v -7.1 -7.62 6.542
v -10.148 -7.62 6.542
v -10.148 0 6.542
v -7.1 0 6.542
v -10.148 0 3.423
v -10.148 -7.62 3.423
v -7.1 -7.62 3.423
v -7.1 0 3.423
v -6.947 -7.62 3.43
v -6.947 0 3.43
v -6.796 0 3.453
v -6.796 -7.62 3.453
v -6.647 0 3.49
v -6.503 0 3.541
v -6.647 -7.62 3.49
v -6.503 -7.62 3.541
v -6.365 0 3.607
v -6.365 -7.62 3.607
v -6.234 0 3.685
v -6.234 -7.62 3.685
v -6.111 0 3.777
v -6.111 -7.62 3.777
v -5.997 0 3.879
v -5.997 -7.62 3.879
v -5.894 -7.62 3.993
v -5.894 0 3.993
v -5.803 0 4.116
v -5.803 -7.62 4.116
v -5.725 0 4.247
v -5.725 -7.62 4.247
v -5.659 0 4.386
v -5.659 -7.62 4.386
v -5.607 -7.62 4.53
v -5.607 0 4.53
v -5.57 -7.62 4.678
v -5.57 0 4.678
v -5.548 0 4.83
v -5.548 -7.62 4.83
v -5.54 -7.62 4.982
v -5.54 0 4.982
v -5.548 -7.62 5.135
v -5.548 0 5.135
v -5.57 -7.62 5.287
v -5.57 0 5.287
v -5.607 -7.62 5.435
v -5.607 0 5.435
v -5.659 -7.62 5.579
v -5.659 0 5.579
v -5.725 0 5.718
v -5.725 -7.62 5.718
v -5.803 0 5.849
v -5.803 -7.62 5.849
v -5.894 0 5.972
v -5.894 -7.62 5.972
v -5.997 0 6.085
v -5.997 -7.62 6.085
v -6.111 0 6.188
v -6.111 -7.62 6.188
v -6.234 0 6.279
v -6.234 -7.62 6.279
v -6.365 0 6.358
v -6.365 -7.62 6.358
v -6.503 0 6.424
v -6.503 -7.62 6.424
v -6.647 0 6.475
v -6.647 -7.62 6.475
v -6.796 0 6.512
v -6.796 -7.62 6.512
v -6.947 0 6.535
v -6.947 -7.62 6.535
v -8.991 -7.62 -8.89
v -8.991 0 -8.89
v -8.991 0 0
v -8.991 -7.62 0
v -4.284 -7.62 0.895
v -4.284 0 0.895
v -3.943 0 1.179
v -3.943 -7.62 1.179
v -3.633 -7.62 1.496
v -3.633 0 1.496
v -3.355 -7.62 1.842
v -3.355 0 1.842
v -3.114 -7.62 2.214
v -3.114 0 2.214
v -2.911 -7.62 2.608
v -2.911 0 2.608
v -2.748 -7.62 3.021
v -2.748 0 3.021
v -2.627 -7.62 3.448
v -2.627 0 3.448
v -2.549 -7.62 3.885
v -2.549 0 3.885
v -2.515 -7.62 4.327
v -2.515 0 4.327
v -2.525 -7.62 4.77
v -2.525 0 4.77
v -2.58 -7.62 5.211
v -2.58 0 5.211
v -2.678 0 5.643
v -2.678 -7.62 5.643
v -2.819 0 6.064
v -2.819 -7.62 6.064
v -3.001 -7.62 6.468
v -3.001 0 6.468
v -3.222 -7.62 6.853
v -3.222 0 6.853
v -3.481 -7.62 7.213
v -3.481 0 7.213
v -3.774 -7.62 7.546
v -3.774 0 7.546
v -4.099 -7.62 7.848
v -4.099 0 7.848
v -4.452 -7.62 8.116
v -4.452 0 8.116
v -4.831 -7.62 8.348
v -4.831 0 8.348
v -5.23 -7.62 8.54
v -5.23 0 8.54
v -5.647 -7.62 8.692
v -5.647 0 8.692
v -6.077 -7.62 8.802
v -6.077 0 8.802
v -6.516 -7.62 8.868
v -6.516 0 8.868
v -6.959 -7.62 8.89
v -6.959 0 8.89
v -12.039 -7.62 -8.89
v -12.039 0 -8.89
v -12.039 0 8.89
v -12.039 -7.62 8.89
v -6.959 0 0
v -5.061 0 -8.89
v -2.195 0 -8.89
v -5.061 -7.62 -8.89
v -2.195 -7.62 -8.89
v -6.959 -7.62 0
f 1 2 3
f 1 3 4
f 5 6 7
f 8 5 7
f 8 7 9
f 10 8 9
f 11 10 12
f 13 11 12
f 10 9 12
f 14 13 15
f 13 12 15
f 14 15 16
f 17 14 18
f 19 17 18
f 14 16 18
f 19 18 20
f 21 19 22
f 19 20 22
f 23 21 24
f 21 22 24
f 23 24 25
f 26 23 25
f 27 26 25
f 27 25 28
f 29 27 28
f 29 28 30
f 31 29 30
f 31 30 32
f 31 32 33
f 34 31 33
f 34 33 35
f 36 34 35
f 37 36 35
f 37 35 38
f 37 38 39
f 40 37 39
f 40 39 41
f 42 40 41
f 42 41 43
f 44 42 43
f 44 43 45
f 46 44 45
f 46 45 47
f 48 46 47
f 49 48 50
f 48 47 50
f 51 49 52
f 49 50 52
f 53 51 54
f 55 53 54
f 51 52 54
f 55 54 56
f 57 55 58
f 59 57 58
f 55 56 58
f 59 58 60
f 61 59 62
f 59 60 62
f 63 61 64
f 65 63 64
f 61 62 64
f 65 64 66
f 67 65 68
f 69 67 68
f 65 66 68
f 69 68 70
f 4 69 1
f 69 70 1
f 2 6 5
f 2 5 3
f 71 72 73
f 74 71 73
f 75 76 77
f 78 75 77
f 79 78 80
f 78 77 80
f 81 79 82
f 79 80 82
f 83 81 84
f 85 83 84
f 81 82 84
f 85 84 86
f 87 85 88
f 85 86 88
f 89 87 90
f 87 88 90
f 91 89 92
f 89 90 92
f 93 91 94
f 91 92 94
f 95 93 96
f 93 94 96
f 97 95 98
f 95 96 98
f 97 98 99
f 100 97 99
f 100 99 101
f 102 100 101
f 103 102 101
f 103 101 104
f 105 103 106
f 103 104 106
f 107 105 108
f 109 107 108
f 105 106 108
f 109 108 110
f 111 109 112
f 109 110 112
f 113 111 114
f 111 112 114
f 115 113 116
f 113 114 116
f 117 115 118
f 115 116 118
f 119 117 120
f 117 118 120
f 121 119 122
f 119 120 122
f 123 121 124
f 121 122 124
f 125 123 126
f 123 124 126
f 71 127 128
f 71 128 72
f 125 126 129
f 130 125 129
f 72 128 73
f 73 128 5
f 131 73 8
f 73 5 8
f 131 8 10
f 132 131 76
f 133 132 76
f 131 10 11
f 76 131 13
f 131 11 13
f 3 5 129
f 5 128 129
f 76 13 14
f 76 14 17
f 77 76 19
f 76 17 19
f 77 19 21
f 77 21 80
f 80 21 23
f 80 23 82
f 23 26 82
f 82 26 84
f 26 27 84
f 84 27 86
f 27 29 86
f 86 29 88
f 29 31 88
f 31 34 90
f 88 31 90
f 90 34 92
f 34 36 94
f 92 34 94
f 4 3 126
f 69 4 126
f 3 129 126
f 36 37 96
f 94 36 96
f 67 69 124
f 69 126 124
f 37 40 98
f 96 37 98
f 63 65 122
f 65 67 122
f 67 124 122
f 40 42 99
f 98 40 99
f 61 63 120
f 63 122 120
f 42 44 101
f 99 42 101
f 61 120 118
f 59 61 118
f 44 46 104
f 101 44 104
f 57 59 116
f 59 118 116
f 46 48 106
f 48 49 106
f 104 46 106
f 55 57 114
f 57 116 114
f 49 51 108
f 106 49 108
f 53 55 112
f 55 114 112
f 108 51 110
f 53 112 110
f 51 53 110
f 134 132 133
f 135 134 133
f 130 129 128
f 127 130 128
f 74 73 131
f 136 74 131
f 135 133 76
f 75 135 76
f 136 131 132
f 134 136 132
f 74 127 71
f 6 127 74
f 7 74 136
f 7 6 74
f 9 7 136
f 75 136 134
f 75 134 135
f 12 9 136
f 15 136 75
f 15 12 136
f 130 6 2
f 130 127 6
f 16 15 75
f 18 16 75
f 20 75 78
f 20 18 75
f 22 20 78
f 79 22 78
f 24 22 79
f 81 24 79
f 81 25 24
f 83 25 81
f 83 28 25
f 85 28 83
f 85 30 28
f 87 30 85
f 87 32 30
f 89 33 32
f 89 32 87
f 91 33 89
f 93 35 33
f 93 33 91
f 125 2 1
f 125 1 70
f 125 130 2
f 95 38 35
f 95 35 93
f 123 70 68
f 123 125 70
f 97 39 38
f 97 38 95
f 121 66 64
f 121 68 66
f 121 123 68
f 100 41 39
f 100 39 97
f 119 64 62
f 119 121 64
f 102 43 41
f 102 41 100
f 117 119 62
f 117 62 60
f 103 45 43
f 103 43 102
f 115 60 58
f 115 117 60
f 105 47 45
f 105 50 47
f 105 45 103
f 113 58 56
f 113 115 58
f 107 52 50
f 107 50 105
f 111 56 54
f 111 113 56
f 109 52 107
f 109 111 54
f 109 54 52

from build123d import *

# Parameters (mm, degrees)
F0_W     = 3.048
F0_H     = 8.89
F1_DEPTH = 7.62
F2_DEPTH = 7.62
F3_W     = 3.048
F3_H     = 3.1197171271
F4_DEPTH = 25.4


# Not quite as in the source:
# - a feature names something its author has since deleted; it is built from what else it names


with BuildPart() as f1:
    # F0 (on Front) → F1 (new body)
    with BuildSketch(Plane.XZ):
        Polygon((-6.9585410112, 8.89), (-12.0385410112, 8.89), (-12.0385410112, 0), (-8.9905410112, 0), (-6.9585410112, 0), align=None)
        with BuildLine():
            ThreePointArc((-4.2838060673, 0.8948143739), (-2.7431762518, 5.8552215946), (-6.9585410112, 8.89))
            Line((-6.9585410112, 8.89), (-6.9585410112, 0))
            ThreePointArc((-6.9585410112, 0), (-5.5483194165, 0.2296352407), (-4.2838060673, 0.8948143739))
        make_face()
        with Locations((-10.5145410112, -4.445)):
            Rectangle(F0_W, F0_H)
    extrude(amount=F1_DEPTH)

    # F0 (on Front) → F2 (join)
    with BuildSketch(Plane.XZ):
        Polygon((-6.9585410112, 8.89), (-12.0385410112, 8.89), (-12.0385410112, 0), (-8.9905410112, 0), (-6.9585410112, 0), align=None)
        with BuildLine():
            ThreePointArc((-4.2838060673, 0.8948143739), (-2.7431762518, 5.8552215946), (-6.9585410112, 8.89))
            Line((-6.9585410112, 8.89), (-6.9585410112, 0))
            ThreePointArc((-6.9585410112, 0), (-5.5483194165, 0.2296352407), (-4.2838060673, 0.8948143739))
        make_face()
        with Locations((-10.5145410112, -4.445)):
            Rectangle(F0_W, F0_H)
        with BuildLine():
            ThreePointArc((-4.2838060673, 0.8948143739), (-5.5483194165, 0.2296352407), (-6.9585410112, 0))
            Line((-6.9585410112, 0), (-5.0608660094, -8.89))
            Line((-5.0608660094, -8.89), (-2.1951224189, -8.89))
            Line((-2.1951224189, -8.89), (-4.2838060673, 0.8948143739))
        make_face()
    extrude(amount=F2_DEPTH)

    # F3 (on face) → F4 (cut)
    with BuildSketch(Plane.XZ.offset(7.62)):
        with Locations((-8.624184413, 4.9824524904)):
            Rectangle(F3_W, F3_H)
        with BuildLine():
            ThreePointArc((-7.100184413, 3.4225939268), (-5.5403258494, 4.9824524904), (-7.100184413, 6.5423110539))
            Line((-7.100184413, 6.5423110539), (-7.100184413, 3.4225939268))
        make_face()
    extrude(amount=-F4_DEPTH, mode=Mode.SUBTRACT)


solid = f1.part
